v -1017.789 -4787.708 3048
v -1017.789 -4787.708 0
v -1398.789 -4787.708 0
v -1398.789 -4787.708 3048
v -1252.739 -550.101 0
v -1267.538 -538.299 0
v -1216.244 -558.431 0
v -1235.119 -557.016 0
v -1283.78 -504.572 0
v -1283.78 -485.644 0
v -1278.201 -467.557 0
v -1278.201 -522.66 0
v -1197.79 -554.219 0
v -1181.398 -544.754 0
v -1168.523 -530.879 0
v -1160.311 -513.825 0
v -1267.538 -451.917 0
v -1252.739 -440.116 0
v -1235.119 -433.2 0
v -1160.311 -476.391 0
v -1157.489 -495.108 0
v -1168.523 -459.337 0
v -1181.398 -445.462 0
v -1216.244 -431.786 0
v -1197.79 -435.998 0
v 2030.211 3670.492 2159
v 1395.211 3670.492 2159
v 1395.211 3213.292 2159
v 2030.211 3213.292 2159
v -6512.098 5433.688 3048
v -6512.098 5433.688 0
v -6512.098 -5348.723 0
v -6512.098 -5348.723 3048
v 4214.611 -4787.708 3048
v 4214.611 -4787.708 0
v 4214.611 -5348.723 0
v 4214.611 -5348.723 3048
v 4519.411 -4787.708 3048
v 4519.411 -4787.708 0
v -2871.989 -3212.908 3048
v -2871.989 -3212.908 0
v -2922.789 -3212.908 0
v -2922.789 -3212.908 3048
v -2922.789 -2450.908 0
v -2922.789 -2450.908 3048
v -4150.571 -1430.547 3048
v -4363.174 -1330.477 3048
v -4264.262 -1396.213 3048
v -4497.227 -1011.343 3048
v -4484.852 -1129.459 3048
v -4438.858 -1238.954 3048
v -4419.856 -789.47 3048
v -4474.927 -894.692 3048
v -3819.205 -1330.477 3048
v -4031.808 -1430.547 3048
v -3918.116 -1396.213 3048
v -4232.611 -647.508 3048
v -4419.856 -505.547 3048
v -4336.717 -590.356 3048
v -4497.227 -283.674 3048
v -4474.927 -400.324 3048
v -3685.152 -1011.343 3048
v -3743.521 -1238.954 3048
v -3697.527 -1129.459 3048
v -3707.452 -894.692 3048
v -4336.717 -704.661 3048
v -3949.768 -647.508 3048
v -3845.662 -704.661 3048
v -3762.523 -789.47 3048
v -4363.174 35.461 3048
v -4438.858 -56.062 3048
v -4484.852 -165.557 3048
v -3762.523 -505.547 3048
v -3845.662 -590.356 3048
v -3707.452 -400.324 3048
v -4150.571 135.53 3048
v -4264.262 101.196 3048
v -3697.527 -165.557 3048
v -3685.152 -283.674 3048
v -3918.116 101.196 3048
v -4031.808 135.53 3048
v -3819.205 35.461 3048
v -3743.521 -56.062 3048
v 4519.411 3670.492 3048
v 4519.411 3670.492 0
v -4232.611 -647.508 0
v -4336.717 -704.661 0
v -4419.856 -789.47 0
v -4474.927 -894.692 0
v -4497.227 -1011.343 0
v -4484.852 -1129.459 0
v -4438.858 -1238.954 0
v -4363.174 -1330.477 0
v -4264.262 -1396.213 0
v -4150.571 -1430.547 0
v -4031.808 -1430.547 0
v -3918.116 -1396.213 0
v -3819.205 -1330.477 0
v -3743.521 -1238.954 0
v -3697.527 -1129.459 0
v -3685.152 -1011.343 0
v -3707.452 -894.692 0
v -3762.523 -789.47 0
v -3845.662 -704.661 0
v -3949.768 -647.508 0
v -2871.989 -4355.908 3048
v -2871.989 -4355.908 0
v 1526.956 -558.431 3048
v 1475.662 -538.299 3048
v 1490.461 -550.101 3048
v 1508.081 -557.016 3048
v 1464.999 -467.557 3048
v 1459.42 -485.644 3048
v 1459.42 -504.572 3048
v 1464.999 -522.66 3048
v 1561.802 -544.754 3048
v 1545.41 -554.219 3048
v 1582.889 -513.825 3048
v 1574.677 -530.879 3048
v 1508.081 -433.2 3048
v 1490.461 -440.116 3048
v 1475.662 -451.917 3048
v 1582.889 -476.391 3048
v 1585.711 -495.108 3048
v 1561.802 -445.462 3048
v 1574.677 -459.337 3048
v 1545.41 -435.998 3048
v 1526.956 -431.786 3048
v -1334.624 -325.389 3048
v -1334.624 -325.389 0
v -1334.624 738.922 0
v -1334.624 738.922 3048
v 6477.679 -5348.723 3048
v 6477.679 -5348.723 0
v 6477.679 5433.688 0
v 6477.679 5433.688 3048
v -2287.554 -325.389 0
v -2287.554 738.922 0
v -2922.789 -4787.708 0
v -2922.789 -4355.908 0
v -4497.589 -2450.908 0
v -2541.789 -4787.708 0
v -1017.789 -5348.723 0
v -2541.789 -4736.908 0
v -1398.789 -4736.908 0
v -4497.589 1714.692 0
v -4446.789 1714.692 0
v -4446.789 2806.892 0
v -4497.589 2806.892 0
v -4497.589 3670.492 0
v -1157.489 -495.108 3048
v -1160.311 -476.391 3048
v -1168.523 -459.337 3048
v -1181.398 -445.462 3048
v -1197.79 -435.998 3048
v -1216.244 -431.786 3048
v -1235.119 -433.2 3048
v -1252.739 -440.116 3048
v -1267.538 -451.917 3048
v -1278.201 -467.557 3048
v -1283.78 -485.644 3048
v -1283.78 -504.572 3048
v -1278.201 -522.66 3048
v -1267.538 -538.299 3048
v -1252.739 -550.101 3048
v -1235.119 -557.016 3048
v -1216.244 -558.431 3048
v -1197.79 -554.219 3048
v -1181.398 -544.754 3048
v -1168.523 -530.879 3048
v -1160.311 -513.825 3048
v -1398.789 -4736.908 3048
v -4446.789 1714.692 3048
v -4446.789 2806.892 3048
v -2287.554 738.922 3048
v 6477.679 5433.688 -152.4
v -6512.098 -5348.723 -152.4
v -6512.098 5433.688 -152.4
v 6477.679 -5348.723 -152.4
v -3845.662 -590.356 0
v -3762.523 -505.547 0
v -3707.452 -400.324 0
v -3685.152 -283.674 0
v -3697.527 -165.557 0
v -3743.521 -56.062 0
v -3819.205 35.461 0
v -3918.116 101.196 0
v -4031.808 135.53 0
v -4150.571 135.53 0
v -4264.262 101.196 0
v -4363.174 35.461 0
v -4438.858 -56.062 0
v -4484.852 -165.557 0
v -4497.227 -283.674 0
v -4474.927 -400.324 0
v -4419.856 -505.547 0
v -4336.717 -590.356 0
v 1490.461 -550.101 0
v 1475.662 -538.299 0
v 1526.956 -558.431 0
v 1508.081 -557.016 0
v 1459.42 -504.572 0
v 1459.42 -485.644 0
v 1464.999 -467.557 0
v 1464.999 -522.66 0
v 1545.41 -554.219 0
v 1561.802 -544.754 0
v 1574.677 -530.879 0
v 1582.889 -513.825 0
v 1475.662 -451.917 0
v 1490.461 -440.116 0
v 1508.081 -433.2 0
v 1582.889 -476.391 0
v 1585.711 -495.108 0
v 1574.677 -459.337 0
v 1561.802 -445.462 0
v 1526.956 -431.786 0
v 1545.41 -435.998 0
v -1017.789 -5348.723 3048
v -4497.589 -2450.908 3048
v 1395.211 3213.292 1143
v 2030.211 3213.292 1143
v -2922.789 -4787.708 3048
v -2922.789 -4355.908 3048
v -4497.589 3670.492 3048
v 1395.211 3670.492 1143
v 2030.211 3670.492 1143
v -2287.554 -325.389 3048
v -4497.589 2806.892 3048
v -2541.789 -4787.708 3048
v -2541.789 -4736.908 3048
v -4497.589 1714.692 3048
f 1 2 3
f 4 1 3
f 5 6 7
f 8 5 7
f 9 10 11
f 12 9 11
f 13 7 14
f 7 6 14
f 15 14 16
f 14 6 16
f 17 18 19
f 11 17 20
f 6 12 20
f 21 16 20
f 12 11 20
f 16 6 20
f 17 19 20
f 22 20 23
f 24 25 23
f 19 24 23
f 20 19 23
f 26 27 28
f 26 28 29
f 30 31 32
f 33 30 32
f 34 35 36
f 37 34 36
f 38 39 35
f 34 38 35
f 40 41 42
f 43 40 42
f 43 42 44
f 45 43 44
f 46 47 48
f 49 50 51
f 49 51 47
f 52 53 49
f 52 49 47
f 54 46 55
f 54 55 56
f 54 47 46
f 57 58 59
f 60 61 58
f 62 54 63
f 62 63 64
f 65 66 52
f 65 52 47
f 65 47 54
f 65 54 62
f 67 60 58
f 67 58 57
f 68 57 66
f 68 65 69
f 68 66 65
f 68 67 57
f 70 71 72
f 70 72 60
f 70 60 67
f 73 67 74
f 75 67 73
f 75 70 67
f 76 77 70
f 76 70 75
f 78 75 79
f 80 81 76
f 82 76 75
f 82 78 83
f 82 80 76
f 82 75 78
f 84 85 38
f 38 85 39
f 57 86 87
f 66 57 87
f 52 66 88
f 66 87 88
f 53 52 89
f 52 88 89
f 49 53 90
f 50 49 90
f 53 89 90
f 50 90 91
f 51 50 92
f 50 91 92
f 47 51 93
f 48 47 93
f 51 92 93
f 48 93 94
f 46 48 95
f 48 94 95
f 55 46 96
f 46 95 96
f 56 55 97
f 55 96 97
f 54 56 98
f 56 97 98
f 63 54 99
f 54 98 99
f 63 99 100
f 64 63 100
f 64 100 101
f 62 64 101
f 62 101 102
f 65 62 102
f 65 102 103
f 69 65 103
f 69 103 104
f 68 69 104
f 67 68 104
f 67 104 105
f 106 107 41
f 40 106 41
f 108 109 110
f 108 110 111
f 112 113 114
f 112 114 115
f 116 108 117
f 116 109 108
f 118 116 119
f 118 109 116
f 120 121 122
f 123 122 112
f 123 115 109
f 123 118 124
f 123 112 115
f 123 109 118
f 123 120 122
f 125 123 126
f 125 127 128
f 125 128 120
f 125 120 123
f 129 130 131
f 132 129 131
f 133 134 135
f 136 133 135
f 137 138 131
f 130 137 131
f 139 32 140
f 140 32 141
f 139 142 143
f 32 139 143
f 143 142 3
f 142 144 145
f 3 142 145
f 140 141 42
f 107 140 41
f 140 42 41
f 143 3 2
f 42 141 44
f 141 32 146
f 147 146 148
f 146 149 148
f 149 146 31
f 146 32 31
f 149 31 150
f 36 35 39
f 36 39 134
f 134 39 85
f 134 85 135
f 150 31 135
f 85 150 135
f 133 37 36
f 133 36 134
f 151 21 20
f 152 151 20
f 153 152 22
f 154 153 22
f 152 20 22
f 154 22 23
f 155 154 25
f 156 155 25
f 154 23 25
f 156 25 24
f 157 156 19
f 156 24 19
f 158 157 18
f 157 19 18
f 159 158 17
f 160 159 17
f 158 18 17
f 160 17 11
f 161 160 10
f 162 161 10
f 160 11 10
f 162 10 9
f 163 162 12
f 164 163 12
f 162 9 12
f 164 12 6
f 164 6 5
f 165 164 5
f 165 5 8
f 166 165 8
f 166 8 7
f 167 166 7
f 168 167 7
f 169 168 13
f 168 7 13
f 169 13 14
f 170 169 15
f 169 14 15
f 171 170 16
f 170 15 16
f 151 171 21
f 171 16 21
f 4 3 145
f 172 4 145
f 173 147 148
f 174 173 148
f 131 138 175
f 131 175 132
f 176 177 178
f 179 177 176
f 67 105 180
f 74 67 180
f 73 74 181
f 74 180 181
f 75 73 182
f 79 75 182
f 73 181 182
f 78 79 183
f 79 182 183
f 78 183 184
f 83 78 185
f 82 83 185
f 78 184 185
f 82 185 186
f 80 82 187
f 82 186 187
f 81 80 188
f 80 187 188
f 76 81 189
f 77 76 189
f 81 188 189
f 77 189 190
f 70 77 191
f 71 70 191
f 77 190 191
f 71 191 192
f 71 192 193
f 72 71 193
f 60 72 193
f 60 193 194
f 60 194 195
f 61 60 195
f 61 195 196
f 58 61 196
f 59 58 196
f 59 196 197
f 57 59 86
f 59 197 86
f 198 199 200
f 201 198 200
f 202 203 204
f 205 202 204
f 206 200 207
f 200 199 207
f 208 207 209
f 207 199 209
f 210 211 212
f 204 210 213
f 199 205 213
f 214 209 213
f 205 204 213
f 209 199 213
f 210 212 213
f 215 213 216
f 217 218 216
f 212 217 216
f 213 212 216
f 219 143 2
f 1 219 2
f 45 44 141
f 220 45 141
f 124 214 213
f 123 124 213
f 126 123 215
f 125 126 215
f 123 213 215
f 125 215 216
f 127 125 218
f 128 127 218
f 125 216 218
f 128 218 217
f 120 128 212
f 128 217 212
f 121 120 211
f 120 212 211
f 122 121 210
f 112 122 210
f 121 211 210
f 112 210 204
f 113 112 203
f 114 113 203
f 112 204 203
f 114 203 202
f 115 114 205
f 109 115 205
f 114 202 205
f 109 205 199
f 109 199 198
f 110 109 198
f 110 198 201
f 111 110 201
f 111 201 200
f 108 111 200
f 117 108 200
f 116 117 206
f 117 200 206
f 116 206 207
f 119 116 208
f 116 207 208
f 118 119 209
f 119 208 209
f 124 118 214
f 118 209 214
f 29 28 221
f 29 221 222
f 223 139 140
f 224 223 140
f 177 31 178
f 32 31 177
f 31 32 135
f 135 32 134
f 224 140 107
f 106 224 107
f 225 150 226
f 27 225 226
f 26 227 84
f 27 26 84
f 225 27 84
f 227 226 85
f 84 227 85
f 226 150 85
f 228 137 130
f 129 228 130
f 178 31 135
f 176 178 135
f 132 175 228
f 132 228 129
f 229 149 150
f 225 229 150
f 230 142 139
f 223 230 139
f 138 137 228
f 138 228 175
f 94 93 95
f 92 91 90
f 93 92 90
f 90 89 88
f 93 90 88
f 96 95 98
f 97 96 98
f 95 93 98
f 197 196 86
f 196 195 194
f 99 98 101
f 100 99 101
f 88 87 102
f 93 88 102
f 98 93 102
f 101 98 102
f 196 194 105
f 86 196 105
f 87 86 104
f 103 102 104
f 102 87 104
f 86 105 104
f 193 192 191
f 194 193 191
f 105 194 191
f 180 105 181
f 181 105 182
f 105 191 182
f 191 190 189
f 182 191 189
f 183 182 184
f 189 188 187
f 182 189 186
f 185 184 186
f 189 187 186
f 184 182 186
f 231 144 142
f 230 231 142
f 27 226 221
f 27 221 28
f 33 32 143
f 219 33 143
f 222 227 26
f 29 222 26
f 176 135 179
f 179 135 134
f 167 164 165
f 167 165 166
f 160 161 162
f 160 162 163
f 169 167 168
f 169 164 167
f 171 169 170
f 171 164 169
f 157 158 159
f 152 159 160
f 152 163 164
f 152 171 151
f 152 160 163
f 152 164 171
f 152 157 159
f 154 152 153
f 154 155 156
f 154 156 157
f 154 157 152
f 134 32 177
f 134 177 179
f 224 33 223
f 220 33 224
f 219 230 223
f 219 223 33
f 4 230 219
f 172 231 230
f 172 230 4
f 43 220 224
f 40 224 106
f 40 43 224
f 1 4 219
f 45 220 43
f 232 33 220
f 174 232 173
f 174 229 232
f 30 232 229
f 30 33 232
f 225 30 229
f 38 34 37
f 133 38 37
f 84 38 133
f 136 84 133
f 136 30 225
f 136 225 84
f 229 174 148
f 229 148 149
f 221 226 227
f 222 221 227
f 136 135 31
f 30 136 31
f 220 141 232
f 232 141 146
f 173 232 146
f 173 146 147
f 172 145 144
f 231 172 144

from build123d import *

# Parameters (mm, degrees)
F1_DEPTH = 3048
F0_R     = 63.5
F0_W     = 952.929854393
F0_H     = 1064.3113255501
F2_W     = 12989.7775650024
F2_H     = 10782.4106216431
F3_DEPTH = 152.4
F4_W     = 635
F4_H     = 1016
F5_DEPTH = 457.2


with BuildPart() as f1:
    # F0 (on Top) → F1 (new body)
    with BuildSketch(Plane.XY):
        Polygon((-4497.5893844604, 2806.8917998496), (-4497.5893844604, 3670.4917998496), (1395.2106155395, 3670.4917998496), (2030.2106155395, 3670.4917998496), (4519.4106155395, 3670.4917998496), (4519.4106155396, -4787.7082001504), (4214.6106155396, -4787.7082001504), (4214.6106155396, -5348.7229347229), (6477.6792526245, -5348.7229347229), (6477.6792526245, 5433.6876869202), (-6512.0983123779, 5433.6876869202), (-6512.0983123779, -4787.7082001504), (-6512.0983123779, -5348.7229347229), (-1017.7893844604, -5348.7229347229), (-1017.7893844604, -4787.7082001504), (-1398.7893844604, -4787.7082001504), (-1398.7893844604, -4736.9082001504), (-2541.7893844604, -4736.9082001504), (-2541.7893844604, -4787.7082001504), (-2922.7893844604, -4787.7082001504), (-2922.7893844604, -4355.9082001504), (-2871.9893844604, -4355.9082001504), (-2871.9893844604, -3212.9082001504), (-2922.7893844604, -3212.9082001504), (-2922.7893844604, -2450.9082001504), (-4497.5893844604, -2450.9082001504), (-4497.5893844604, -1434.9082001504), (-4497.5893844604, -1028.5082001504), (-4497.5893844604, -266.5082001504), (-4497.5893844604, 139.8917998496), (-4497.5893844604, 1714.6917998496), (-4446.7893844605, 1714.6917998496), (-4446.7893844605, 2806.8917998496), align=None)
    extrude(amount=F1_DEPTH)

    # F4 (on face) → F5 (join)
    with BuildSketch(Plane.XZ.offset(-3670.4917998496)):
        with Locations((1712.7106155396, 1651)):
            Rectangle(F4_W, F4_H)
    extrude(amount=F5_DEPTH)


with BuildPart() as f1b:
    # F0 (on Top) → F1, piece 2 (new body)
    with BuildSketch(Plane.XY):
        with Locations((1522.2106155396, -495.1082001504)):
            Circle(F0_R)
    extrude(amount=F1_DEPTH)


with BuildPart() as f1c:
    # F0 (on Top) → F1, piece 3 (new body)
    with BuildSketch(Plane.XY):
        with Locations((-1811.0886216164, 206.7666947842)):
            Rectangle(F0_W, F0_H)
    extrude(amount=F1_DEPTH)


with BuildPart() as f1d:
    # F0 (on Top) → F1, piece 4 (new body)
    with BuildSketch(Plane.XY):
        with BuildLine():
            ThreePointArc((-3949.7681696446, -647.5082001504), (-3859.1469548287, 67.1342294814), (-4497.5893844604, -266.5082001504))
            ThreePointArc((-4497.5893844604, -266.5082001504), (-4424.8318140922, -498.5506297821), (-4232.6105992763, -647.5082001504))
            ThreePointArc((-4232.6105992763, -647.5082001504), (-4424.8318140922, -796.4657705186), (-4497.5893844604, -1028.5082001504))
            ThreePointArc((-4497.5893844604, -1028.5082001504), (-3859.1469548287, -1362.1506297821), (-3949.7681696446, -647.5082001504))
        make_face()
    extrude(amount=F1_DEPTH)


with BuildPart() as f1e:
    # F0 (on Top) → F1, piece 5 (new body)
    with BuildSketch(Plane.XY):
        with Locations((-1220.9893844604, -495.1082001504)):
            Circle(F0_R)
    extrude(amount=F1_DEPTH)


with BuildPart() as f3:
    # F2 (on face) → F3 (new body)
    with BuildSketch(Plane(origin=(0, 0, 0), x_dir=(1, 0, 0), z_dir=(0, 0, -1))):
        with Locations((-17.2095298767, -42.4823760986)):
            Rectangle(F2_W, F2_H)
    extrude(amount=F3_DEPTH)


solid = Compound([f1.part, f1b.part, f1c.part, f1d.part, f1e.part, f3.part])
